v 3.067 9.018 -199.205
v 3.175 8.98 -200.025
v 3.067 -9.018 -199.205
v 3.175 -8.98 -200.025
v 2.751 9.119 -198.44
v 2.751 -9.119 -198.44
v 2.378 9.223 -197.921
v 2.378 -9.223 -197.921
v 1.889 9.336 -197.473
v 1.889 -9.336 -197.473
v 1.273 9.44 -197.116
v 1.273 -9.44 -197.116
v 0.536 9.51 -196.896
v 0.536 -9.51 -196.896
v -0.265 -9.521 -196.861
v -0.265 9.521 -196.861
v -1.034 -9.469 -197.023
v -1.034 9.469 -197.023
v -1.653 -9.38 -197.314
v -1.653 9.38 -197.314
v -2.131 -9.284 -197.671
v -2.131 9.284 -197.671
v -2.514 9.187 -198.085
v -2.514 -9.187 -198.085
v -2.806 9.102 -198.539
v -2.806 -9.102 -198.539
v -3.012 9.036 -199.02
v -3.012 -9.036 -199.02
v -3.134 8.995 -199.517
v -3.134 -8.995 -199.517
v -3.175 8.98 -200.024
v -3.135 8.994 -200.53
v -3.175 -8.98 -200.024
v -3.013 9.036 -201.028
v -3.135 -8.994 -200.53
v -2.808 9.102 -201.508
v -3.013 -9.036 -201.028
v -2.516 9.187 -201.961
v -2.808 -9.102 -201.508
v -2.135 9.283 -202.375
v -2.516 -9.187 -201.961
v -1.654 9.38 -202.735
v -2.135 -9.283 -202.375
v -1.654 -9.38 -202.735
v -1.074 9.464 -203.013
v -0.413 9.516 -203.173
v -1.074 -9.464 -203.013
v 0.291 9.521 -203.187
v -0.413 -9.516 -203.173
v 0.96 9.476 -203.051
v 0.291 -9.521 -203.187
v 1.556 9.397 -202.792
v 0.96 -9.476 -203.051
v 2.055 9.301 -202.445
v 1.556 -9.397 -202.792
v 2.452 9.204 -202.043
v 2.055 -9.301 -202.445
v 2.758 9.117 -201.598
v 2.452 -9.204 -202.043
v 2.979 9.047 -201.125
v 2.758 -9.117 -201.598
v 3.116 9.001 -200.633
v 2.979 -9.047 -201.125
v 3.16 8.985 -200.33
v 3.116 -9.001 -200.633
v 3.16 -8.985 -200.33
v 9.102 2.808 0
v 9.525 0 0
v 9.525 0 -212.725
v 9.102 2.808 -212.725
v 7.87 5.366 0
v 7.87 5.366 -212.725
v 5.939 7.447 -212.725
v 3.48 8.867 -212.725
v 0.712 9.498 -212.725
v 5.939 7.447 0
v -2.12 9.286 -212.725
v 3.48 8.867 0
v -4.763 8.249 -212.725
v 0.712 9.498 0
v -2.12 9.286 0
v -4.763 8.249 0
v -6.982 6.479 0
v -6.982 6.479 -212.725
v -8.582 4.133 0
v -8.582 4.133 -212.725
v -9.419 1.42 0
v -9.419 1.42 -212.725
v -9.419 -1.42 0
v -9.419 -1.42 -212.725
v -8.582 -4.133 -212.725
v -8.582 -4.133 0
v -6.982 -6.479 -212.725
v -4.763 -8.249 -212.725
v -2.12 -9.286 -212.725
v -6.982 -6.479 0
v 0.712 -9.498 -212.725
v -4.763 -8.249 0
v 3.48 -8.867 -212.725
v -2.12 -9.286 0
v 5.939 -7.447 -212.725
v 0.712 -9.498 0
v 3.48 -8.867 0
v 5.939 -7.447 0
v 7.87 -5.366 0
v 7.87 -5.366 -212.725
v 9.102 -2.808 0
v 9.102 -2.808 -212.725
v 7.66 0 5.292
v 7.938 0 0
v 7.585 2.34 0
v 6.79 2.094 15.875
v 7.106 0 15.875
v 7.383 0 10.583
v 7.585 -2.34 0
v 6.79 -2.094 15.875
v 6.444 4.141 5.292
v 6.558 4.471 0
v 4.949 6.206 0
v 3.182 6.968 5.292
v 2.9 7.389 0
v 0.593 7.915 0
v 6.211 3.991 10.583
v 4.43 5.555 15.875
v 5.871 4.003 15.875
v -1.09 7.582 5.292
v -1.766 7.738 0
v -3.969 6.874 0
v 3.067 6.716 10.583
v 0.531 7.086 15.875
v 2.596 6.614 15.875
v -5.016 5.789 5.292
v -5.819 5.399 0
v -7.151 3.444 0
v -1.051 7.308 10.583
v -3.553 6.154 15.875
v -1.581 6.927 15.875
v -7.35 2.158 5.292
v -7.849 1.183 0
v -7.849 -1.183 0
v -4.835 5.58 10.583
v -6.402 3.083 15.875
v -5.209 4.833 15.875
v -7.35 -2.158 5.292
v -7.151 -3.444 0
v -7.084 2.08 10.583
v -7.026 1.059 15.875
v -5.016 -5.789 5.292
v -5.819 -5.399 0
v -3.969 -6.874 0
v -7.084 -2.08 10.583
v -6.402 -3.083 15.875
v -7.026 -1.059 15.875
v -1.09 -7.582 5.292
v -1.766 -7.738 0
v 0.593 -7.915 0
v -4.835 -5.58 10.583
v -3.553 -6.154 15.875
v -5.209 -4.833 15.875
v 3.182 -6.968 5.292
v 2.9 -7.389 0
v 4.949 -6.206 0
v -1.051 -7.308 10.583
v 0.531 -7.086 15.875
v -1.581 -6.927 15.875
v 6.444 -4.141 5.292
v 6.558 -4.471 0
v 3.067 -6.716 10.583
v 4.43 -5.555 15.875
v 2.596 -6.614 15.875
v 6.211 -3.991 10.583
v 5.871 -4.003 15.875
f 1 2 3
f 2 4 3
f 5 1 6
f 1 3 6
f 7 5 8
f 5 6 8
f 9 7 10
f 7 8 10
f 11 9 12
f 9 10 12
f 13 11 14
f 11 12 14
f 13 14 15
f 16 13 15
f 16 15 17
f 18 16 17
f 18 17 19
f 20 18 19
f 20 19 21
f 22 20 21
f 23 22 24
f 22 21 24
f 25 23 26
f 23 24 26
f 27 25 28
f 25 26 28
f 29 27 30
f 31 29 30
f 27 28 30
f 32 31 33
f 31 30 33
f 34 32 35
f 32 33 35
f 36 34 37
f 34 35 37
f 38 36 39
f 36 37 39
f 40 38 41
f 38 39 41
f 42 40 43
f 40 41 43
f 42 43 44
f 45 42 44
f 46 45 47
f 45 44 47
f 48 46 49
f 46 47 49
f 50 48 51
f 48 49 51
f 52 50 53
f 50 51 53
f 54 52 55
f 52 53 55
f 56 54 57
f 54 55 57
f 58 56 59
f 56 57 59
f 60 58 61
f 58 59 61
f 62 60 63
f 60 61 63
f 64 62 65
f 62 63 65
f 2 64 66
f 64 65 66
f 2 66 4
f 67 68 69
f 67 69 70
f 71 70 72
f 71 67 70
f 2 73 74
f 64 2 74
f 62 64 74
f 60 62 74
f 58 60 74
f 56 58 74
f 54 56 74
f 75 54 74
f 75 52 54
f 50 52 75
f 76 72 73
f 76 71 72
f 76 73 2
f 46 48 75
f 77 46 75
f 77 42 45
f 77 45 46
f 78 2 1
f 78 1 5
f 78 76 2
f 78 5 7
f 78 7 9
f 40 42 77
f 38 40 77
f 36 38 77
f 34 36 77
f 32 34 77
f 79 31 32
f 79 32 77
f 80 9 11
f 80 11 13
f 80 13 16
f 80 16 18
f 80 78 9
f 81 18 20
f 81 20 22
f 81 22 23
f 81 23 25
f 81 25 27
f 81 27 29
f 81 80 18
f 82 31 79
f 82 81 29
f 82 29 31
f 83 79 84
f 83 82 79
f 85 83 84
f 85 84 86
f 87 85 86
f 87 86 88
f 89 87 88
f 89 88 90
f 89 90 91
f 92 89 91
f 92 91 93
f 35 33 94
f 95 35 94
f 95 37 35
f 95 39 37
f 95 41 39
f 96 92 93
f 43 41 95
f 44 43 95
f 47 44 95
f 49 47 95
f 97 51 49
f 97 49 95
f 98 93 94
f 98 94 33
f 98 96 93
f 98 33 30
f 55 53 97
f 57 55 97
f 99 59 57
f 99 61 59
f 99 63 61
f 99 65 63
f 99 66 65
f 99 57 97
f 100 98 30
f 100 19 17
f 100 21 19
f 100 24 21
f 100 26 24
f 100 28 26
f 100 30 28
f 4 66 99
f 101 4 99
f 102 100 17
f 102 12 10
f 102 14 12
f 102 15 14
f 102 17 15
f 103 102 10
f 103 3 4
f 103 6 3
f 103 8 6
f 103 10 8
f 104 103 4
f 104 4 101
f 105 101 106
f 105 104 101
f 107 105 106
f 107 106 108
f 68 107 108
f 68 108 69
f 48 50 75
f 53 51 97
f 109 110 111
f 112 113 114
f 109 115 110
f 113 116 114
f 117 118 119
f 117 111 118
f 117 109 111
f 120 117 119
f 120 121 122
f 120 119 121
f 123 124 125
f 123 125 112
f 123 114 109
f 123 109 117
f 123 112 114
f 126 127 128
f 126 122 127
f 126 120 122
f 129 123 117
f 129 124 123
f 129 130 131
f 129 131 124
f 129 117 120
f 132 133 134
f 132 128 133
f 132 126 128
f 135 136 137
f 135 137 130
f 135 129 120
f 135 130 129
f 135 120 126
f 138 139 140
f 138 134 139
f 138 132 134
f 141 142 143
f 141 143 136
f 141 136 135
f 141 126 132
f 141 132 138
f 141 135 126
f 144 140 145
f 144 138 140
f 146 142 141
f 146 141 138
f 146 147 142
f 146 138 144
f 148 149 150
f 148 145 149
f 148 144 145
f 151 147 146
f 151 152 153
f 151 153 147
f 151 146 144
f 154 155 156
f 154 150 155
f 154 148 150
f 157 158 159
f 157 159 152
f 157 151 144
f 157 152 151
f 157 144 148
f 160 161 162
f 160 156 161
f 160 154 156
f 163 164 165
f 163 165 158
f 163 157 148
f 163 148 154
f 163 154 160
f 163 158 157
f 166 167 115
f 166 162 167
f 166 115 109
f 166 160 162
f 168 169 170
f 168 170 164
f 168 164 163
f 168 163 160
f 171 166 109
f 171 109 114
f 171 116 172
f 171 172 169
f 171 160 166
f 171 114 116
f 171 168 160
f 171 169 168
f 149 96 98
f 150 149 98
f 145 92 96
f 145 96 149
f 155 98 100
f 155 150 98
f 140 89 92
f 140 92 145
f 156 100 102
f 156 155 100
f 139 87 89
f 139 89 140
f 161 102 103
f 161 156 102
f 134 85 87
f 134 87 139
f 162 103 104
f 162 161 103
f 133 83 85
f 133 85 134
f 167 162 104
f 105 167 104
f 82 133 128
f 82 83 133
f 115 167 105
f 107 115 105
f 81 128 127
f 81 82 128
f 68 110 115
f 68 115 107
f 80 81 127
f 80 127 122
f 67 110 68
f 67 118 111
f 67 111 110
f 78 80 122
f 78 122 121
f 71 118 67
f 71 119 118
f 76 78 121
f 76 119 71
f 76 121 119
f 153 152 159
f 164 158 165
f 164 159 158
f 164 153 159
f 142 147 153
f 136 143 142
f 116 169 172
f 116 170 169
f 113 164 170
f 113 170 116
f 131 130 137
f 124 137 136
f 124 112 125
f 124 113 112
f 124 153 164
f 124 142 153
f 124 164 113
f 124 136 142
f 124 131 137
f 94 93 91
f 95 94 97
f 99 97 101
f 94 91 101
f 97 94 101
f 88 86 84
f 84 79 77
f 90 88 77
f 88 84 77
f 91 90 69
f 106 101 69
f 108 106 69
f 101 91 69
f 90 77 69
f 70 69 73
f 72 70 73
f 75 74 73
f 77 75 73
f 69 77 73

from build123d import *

# Parameters (mm, degrees)
F0_R     = 9.525
F1_DEPTH = 212.725
F2_R     = 7.9375
F3_DEPTH = 15.875
F3_TAPER = 3
F4_R     = 3.175
F5_DEPTH = 12.7


with BuildPart() as f1:
    # F0 (on Top) → F1 (new body)
    with BuildSketch(Plane.XY):
        Circle(F0_R)
    extrude(amount=-F1_DEPTH)

    # F2 (on face) → F3 (join)
    with BuildSketch(Plane.XY):
        Circle(F2_R)
    extrude(amount=F3_DEPTH, taper=F3_TAPER)

    # F4 (on Front) → F5 (cut, symmetric)
    with BuildSketch(Plane.XZ):
        with Locations((0, -200.025)):
            Circle(F4_R)
    extrude(amount=F5_DEPTH, both=True, mode=Mode.SUBTRACT)


solid = f1.part
